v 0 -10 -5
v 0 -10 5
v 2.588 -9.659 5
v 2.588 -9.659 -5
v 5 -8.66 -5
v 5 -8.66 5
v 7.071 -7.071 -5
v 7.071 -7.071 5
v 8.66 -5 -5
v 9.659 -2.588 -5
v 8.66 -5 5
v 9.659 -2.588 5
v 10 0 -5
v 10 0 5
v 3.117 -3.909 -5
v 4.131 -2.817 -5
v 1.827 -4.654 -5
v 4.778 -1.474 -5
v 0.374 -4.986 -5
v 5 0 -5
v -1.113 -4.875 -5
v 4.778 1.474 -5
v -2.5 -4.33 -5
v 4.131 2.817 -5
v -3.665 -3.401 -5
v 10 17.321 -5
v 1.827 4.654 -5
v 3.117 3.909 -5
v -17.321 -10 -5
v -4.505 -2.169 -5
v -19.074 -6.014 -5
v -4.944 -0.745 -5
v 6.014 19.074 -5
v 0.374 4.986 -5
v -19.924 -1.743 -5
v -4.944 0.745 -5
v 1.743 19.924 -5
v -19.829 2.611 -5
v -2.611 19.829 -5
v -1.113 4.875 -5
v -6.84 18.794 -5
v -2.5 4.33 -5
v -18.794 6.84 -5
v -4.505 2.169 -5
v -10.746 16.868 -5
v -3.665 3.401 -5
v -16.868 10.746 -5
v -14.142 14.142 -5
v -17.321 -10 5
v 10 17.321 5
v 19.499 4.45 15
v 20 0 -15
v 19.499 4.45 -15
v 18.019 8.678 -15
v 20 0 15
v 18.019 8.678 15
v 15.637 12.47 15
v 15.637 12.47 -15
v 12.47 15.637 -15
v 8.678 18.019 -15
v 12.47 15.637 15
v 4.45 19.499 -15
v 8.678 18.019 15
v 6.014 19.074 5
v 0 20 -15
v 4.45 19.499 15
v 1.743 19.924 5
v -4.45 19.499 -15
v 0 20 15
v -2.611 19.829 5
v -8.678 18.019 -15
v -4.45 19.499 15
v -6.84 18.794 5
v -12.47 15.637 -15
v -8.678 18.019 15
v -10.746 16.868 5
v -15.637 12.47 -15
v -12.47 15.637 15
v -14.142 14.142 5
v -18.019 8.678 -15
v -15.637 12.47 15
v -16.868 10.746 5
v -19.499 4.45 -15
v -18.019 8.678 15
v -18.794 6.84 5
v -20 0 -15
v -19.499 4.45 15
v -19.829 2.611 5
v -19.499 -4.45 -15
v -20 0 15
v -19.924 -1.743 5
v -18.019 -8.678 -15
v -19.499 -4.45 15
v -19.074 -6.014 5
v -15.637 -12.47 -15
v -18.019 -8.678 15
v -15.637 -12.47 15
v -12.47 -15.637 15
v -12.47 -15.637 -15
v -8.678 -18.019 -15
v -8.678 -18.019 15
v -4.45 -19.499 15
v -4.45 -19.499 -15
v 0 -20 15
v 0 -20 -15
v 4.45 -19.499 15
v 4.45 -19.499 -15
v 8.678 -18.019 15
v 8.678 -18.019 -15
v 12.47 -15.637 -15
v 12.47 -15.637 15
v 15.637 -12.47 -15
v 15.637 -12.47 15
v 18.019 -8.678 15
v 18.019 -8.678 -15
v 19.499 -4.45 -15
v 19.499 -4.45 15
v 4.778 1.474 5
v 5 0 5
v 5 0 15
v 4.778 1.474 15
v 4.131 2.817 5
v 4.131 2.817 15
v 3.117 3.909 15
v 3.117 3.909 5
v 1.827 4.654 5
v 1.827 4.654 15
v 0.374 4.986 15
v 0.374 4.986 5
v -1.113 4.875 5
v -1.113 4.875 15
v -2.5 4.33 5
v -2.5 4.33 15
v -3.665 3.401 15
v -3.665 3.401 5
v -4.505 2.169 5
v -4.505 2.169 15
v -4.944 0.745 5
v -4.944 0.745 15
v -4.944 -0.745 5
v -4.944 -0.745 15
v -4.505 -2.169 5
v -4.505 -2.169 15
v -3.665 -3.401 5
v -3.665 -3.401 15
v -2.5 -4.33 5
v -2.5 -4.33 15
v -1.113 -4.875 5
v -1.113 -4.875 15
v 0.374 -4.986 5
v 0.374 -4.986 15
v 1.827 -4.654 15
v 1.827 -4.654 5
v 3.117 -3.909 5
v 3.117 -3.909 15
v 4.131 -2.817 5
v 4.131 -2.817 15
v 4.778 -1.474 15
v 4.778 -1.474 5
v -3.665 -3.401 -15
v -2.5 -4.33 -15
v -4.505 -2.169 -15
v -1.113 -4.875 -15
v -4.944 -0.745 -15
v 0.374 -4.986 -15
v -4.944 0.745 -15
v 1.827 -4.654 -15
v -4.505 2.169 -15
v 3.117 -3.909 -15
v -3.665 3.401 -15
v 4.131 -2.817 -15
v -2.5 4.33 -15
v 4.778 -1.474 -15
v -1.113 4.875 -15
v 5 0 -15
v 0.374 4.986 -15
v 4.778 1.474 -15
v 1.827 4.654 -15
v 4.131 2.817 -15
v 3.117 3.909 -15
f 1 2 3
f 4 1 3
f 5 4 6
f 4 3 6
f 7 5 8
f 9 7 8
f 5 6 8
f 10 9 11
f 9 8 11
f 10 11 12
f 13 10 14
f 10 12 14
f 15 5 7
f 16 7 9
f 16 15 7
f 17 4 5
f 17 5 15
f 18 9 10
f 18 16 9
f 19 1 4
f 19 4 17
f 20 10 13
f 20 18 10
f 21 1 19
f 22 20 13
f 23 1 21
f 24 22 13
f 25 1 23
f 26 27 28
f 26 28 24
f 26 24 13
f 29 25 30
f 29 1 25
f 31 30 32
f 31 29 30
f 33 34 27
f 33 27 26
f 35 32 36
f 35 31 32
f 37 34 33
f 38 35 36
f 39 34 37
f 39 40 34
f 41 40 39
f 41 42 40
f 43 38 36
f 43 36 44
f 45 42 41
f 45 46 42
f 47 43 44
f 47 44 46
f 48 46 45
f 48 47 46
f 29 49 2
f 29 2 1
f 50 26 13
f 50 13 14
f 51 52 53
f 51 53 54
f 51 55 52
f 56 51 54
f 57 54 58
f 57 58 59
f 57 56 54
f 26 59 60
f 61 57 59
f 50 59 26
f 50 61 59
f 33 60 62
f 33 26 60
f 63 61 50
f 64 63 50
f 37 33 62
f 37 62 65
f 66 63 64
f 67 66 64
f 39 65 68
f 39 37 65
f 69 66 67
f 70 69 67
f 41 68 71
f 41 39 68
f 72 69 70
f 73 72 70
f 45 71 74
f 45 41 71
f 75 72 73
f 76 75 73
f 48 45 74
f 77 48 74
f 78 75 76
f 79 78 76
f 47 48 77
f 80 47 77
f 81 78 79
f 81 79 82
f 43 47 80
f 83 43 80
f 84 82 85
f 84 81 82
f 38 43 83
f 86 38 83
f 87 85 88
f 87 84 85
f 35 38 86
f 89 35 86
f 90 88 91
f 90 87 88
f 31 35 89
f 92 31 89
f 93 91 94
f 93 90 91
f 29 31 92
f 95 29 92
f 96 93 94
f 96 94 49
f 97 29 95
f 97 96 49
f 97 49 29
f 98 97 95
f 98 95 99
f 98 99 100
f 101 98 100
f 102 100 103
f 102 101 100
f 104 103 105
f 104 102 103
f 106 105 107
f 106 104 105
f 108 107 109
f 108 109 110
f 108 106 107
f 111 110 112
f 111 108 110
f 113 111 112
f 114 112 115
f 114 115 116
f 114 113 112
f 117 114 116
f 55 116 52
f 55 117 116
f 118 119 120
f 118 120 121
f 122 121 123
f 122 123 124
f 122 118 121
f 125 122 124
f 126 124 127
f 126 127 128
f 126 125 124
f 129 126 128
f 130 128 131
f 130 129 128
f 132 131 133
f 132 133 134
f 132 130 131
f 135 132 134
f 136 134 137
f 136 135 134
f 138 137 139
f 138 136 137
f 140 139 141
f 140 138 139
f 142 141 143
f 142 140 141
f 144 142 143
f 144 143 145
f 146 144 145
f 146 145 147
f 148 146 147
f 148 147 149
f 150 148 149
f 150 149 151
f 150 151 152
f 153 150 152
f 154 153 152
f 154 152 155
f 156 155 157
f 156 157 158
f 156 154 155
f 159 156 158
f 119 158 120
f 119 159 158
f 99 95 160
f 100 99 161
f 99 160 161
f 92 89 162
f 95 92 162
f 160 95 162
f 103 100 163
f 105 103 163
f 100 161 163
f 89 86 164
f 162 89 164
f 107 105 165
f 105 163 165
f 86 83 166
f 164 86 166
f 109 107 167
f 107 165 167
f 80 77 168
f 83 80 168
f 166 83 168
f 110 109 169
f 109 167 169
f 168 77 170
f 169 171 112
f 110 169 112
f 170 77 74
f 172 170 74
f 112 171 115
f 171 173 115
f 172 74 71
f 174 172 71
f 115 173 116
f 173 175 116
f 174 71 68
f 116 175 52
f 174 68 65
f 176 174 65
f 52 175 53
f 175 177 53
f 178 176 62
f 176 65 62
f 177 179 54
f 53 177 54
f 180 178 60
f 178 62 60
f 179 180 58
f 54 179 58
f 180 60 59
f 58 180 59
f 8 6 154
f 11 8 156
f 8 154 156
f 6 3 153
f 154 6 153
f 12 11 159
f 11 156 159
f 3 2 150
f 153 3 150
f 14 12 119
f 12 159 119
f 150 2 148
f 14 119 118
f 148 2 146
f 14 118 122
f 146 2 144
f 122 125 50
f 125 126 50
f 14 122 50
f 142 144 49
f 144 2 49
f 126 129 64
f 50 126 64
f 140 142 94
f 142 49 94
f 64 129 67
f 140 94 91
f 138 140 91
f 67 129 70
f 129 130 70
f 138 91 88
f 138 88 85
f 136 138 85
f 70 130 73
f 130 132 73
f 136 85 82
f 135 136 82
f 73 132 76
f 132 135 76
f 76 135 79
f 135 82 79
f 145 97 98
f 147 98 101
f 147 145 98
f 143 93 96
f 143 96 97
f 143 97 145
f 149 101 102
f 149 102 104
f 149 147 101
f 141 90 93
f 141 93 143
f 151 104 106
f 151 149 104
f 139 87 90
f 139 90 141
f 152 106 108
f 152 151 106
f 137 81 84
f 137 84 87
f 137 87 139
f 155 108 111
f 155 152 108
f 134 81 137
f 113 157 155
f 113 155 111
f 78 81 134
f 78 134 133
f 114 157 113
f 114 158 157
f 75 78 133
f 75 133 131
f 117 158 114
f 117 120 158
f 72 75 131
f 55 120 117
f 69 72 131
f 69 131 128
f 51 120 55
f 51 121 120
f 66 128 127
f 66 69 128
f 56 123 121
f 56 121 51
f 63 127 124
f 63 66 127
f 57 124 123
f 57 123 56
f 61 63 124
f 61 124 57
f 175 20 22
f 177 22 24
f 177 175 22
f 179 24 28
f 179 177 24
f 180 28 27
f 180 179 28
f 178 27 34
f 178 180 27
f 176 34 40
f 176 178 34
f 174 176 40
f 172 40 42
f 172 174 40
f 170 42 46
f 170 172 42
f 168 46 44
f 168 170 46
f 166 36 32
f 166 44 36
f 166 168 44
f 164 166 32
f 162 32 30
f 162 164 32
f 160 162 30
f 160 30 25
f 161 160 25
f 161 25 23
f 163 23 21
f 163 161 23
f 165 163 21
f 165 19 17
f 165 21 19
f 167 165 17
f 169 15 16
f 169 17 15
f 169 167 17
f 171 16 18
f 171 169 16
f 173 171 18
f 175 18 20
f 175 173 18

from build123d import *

# Parameters (mm, degrees)
CROQUIS1_R              = 20
CROQUIS1_R_2            = 5
SALIENTE_EXTRUIR1_DEPTH = 15
CROQUIS6_R              = 10
CORTAR_EXTRUIR6_DEPTH   = 5
CROQUIS7_W              = 10
CROQUIS7_H              = 30
CORTAR_EXTRUIR7_DEPTH   = 36
CROQUIS8_W              = 10
CROQUIS8_H              = 20
CORTAR_EXTRUIR9_DEPTH   = 10


with BuildPart() as part:
    # Croquis1 → Saliente-Extruir1 (new, symmetric)
    with BuildSketch(Plane.XY):
        Circle(CROQUIS1_R)
        Circle(CROQUIS1_R_2, mode=Mode.SUBTRACT)
    extrude(amount=SALIENTE_EXTRUIR1_DEPTH, both=True)

    # Croquis6 → Cortar-Extruir6 (cut, symmetric)
    with BuildSketch(Plane.XY):
        Circle(CROQUIS6_R)
    extrude(amount=CORTAR_EXTRUIR6_DEPTH, both=True, mode=Mode.SUBTRACT)

    # Croquis7 → Cortar-Extruir7 (cut)
    with BuildSketch(Plane(origin=(0, 0, 0), x_dir=(0, 0, -1), z_dir=(1, 0, 0))):
        with Locations((0, 5)):
            Rectangle(CROQUIS7_W, CROQUIS7_H)
    extrude(amount=-CORTAR_EXTRUIR7_DEPTH, mode=Mode.SUBTRACT)

    # Croquis8 → Cortar-Extruir9 (cut)
    with BuildSketch(Plane.ZY):
        with Locations((0, 10)):
            Rectangle(CROQUIS8_W, CROQUIS8_H)
    extrude(amount=-CORTAR_EXTRUIR9_DEPTH, mode=Mode.SUBTRACT)


solid = part.part
